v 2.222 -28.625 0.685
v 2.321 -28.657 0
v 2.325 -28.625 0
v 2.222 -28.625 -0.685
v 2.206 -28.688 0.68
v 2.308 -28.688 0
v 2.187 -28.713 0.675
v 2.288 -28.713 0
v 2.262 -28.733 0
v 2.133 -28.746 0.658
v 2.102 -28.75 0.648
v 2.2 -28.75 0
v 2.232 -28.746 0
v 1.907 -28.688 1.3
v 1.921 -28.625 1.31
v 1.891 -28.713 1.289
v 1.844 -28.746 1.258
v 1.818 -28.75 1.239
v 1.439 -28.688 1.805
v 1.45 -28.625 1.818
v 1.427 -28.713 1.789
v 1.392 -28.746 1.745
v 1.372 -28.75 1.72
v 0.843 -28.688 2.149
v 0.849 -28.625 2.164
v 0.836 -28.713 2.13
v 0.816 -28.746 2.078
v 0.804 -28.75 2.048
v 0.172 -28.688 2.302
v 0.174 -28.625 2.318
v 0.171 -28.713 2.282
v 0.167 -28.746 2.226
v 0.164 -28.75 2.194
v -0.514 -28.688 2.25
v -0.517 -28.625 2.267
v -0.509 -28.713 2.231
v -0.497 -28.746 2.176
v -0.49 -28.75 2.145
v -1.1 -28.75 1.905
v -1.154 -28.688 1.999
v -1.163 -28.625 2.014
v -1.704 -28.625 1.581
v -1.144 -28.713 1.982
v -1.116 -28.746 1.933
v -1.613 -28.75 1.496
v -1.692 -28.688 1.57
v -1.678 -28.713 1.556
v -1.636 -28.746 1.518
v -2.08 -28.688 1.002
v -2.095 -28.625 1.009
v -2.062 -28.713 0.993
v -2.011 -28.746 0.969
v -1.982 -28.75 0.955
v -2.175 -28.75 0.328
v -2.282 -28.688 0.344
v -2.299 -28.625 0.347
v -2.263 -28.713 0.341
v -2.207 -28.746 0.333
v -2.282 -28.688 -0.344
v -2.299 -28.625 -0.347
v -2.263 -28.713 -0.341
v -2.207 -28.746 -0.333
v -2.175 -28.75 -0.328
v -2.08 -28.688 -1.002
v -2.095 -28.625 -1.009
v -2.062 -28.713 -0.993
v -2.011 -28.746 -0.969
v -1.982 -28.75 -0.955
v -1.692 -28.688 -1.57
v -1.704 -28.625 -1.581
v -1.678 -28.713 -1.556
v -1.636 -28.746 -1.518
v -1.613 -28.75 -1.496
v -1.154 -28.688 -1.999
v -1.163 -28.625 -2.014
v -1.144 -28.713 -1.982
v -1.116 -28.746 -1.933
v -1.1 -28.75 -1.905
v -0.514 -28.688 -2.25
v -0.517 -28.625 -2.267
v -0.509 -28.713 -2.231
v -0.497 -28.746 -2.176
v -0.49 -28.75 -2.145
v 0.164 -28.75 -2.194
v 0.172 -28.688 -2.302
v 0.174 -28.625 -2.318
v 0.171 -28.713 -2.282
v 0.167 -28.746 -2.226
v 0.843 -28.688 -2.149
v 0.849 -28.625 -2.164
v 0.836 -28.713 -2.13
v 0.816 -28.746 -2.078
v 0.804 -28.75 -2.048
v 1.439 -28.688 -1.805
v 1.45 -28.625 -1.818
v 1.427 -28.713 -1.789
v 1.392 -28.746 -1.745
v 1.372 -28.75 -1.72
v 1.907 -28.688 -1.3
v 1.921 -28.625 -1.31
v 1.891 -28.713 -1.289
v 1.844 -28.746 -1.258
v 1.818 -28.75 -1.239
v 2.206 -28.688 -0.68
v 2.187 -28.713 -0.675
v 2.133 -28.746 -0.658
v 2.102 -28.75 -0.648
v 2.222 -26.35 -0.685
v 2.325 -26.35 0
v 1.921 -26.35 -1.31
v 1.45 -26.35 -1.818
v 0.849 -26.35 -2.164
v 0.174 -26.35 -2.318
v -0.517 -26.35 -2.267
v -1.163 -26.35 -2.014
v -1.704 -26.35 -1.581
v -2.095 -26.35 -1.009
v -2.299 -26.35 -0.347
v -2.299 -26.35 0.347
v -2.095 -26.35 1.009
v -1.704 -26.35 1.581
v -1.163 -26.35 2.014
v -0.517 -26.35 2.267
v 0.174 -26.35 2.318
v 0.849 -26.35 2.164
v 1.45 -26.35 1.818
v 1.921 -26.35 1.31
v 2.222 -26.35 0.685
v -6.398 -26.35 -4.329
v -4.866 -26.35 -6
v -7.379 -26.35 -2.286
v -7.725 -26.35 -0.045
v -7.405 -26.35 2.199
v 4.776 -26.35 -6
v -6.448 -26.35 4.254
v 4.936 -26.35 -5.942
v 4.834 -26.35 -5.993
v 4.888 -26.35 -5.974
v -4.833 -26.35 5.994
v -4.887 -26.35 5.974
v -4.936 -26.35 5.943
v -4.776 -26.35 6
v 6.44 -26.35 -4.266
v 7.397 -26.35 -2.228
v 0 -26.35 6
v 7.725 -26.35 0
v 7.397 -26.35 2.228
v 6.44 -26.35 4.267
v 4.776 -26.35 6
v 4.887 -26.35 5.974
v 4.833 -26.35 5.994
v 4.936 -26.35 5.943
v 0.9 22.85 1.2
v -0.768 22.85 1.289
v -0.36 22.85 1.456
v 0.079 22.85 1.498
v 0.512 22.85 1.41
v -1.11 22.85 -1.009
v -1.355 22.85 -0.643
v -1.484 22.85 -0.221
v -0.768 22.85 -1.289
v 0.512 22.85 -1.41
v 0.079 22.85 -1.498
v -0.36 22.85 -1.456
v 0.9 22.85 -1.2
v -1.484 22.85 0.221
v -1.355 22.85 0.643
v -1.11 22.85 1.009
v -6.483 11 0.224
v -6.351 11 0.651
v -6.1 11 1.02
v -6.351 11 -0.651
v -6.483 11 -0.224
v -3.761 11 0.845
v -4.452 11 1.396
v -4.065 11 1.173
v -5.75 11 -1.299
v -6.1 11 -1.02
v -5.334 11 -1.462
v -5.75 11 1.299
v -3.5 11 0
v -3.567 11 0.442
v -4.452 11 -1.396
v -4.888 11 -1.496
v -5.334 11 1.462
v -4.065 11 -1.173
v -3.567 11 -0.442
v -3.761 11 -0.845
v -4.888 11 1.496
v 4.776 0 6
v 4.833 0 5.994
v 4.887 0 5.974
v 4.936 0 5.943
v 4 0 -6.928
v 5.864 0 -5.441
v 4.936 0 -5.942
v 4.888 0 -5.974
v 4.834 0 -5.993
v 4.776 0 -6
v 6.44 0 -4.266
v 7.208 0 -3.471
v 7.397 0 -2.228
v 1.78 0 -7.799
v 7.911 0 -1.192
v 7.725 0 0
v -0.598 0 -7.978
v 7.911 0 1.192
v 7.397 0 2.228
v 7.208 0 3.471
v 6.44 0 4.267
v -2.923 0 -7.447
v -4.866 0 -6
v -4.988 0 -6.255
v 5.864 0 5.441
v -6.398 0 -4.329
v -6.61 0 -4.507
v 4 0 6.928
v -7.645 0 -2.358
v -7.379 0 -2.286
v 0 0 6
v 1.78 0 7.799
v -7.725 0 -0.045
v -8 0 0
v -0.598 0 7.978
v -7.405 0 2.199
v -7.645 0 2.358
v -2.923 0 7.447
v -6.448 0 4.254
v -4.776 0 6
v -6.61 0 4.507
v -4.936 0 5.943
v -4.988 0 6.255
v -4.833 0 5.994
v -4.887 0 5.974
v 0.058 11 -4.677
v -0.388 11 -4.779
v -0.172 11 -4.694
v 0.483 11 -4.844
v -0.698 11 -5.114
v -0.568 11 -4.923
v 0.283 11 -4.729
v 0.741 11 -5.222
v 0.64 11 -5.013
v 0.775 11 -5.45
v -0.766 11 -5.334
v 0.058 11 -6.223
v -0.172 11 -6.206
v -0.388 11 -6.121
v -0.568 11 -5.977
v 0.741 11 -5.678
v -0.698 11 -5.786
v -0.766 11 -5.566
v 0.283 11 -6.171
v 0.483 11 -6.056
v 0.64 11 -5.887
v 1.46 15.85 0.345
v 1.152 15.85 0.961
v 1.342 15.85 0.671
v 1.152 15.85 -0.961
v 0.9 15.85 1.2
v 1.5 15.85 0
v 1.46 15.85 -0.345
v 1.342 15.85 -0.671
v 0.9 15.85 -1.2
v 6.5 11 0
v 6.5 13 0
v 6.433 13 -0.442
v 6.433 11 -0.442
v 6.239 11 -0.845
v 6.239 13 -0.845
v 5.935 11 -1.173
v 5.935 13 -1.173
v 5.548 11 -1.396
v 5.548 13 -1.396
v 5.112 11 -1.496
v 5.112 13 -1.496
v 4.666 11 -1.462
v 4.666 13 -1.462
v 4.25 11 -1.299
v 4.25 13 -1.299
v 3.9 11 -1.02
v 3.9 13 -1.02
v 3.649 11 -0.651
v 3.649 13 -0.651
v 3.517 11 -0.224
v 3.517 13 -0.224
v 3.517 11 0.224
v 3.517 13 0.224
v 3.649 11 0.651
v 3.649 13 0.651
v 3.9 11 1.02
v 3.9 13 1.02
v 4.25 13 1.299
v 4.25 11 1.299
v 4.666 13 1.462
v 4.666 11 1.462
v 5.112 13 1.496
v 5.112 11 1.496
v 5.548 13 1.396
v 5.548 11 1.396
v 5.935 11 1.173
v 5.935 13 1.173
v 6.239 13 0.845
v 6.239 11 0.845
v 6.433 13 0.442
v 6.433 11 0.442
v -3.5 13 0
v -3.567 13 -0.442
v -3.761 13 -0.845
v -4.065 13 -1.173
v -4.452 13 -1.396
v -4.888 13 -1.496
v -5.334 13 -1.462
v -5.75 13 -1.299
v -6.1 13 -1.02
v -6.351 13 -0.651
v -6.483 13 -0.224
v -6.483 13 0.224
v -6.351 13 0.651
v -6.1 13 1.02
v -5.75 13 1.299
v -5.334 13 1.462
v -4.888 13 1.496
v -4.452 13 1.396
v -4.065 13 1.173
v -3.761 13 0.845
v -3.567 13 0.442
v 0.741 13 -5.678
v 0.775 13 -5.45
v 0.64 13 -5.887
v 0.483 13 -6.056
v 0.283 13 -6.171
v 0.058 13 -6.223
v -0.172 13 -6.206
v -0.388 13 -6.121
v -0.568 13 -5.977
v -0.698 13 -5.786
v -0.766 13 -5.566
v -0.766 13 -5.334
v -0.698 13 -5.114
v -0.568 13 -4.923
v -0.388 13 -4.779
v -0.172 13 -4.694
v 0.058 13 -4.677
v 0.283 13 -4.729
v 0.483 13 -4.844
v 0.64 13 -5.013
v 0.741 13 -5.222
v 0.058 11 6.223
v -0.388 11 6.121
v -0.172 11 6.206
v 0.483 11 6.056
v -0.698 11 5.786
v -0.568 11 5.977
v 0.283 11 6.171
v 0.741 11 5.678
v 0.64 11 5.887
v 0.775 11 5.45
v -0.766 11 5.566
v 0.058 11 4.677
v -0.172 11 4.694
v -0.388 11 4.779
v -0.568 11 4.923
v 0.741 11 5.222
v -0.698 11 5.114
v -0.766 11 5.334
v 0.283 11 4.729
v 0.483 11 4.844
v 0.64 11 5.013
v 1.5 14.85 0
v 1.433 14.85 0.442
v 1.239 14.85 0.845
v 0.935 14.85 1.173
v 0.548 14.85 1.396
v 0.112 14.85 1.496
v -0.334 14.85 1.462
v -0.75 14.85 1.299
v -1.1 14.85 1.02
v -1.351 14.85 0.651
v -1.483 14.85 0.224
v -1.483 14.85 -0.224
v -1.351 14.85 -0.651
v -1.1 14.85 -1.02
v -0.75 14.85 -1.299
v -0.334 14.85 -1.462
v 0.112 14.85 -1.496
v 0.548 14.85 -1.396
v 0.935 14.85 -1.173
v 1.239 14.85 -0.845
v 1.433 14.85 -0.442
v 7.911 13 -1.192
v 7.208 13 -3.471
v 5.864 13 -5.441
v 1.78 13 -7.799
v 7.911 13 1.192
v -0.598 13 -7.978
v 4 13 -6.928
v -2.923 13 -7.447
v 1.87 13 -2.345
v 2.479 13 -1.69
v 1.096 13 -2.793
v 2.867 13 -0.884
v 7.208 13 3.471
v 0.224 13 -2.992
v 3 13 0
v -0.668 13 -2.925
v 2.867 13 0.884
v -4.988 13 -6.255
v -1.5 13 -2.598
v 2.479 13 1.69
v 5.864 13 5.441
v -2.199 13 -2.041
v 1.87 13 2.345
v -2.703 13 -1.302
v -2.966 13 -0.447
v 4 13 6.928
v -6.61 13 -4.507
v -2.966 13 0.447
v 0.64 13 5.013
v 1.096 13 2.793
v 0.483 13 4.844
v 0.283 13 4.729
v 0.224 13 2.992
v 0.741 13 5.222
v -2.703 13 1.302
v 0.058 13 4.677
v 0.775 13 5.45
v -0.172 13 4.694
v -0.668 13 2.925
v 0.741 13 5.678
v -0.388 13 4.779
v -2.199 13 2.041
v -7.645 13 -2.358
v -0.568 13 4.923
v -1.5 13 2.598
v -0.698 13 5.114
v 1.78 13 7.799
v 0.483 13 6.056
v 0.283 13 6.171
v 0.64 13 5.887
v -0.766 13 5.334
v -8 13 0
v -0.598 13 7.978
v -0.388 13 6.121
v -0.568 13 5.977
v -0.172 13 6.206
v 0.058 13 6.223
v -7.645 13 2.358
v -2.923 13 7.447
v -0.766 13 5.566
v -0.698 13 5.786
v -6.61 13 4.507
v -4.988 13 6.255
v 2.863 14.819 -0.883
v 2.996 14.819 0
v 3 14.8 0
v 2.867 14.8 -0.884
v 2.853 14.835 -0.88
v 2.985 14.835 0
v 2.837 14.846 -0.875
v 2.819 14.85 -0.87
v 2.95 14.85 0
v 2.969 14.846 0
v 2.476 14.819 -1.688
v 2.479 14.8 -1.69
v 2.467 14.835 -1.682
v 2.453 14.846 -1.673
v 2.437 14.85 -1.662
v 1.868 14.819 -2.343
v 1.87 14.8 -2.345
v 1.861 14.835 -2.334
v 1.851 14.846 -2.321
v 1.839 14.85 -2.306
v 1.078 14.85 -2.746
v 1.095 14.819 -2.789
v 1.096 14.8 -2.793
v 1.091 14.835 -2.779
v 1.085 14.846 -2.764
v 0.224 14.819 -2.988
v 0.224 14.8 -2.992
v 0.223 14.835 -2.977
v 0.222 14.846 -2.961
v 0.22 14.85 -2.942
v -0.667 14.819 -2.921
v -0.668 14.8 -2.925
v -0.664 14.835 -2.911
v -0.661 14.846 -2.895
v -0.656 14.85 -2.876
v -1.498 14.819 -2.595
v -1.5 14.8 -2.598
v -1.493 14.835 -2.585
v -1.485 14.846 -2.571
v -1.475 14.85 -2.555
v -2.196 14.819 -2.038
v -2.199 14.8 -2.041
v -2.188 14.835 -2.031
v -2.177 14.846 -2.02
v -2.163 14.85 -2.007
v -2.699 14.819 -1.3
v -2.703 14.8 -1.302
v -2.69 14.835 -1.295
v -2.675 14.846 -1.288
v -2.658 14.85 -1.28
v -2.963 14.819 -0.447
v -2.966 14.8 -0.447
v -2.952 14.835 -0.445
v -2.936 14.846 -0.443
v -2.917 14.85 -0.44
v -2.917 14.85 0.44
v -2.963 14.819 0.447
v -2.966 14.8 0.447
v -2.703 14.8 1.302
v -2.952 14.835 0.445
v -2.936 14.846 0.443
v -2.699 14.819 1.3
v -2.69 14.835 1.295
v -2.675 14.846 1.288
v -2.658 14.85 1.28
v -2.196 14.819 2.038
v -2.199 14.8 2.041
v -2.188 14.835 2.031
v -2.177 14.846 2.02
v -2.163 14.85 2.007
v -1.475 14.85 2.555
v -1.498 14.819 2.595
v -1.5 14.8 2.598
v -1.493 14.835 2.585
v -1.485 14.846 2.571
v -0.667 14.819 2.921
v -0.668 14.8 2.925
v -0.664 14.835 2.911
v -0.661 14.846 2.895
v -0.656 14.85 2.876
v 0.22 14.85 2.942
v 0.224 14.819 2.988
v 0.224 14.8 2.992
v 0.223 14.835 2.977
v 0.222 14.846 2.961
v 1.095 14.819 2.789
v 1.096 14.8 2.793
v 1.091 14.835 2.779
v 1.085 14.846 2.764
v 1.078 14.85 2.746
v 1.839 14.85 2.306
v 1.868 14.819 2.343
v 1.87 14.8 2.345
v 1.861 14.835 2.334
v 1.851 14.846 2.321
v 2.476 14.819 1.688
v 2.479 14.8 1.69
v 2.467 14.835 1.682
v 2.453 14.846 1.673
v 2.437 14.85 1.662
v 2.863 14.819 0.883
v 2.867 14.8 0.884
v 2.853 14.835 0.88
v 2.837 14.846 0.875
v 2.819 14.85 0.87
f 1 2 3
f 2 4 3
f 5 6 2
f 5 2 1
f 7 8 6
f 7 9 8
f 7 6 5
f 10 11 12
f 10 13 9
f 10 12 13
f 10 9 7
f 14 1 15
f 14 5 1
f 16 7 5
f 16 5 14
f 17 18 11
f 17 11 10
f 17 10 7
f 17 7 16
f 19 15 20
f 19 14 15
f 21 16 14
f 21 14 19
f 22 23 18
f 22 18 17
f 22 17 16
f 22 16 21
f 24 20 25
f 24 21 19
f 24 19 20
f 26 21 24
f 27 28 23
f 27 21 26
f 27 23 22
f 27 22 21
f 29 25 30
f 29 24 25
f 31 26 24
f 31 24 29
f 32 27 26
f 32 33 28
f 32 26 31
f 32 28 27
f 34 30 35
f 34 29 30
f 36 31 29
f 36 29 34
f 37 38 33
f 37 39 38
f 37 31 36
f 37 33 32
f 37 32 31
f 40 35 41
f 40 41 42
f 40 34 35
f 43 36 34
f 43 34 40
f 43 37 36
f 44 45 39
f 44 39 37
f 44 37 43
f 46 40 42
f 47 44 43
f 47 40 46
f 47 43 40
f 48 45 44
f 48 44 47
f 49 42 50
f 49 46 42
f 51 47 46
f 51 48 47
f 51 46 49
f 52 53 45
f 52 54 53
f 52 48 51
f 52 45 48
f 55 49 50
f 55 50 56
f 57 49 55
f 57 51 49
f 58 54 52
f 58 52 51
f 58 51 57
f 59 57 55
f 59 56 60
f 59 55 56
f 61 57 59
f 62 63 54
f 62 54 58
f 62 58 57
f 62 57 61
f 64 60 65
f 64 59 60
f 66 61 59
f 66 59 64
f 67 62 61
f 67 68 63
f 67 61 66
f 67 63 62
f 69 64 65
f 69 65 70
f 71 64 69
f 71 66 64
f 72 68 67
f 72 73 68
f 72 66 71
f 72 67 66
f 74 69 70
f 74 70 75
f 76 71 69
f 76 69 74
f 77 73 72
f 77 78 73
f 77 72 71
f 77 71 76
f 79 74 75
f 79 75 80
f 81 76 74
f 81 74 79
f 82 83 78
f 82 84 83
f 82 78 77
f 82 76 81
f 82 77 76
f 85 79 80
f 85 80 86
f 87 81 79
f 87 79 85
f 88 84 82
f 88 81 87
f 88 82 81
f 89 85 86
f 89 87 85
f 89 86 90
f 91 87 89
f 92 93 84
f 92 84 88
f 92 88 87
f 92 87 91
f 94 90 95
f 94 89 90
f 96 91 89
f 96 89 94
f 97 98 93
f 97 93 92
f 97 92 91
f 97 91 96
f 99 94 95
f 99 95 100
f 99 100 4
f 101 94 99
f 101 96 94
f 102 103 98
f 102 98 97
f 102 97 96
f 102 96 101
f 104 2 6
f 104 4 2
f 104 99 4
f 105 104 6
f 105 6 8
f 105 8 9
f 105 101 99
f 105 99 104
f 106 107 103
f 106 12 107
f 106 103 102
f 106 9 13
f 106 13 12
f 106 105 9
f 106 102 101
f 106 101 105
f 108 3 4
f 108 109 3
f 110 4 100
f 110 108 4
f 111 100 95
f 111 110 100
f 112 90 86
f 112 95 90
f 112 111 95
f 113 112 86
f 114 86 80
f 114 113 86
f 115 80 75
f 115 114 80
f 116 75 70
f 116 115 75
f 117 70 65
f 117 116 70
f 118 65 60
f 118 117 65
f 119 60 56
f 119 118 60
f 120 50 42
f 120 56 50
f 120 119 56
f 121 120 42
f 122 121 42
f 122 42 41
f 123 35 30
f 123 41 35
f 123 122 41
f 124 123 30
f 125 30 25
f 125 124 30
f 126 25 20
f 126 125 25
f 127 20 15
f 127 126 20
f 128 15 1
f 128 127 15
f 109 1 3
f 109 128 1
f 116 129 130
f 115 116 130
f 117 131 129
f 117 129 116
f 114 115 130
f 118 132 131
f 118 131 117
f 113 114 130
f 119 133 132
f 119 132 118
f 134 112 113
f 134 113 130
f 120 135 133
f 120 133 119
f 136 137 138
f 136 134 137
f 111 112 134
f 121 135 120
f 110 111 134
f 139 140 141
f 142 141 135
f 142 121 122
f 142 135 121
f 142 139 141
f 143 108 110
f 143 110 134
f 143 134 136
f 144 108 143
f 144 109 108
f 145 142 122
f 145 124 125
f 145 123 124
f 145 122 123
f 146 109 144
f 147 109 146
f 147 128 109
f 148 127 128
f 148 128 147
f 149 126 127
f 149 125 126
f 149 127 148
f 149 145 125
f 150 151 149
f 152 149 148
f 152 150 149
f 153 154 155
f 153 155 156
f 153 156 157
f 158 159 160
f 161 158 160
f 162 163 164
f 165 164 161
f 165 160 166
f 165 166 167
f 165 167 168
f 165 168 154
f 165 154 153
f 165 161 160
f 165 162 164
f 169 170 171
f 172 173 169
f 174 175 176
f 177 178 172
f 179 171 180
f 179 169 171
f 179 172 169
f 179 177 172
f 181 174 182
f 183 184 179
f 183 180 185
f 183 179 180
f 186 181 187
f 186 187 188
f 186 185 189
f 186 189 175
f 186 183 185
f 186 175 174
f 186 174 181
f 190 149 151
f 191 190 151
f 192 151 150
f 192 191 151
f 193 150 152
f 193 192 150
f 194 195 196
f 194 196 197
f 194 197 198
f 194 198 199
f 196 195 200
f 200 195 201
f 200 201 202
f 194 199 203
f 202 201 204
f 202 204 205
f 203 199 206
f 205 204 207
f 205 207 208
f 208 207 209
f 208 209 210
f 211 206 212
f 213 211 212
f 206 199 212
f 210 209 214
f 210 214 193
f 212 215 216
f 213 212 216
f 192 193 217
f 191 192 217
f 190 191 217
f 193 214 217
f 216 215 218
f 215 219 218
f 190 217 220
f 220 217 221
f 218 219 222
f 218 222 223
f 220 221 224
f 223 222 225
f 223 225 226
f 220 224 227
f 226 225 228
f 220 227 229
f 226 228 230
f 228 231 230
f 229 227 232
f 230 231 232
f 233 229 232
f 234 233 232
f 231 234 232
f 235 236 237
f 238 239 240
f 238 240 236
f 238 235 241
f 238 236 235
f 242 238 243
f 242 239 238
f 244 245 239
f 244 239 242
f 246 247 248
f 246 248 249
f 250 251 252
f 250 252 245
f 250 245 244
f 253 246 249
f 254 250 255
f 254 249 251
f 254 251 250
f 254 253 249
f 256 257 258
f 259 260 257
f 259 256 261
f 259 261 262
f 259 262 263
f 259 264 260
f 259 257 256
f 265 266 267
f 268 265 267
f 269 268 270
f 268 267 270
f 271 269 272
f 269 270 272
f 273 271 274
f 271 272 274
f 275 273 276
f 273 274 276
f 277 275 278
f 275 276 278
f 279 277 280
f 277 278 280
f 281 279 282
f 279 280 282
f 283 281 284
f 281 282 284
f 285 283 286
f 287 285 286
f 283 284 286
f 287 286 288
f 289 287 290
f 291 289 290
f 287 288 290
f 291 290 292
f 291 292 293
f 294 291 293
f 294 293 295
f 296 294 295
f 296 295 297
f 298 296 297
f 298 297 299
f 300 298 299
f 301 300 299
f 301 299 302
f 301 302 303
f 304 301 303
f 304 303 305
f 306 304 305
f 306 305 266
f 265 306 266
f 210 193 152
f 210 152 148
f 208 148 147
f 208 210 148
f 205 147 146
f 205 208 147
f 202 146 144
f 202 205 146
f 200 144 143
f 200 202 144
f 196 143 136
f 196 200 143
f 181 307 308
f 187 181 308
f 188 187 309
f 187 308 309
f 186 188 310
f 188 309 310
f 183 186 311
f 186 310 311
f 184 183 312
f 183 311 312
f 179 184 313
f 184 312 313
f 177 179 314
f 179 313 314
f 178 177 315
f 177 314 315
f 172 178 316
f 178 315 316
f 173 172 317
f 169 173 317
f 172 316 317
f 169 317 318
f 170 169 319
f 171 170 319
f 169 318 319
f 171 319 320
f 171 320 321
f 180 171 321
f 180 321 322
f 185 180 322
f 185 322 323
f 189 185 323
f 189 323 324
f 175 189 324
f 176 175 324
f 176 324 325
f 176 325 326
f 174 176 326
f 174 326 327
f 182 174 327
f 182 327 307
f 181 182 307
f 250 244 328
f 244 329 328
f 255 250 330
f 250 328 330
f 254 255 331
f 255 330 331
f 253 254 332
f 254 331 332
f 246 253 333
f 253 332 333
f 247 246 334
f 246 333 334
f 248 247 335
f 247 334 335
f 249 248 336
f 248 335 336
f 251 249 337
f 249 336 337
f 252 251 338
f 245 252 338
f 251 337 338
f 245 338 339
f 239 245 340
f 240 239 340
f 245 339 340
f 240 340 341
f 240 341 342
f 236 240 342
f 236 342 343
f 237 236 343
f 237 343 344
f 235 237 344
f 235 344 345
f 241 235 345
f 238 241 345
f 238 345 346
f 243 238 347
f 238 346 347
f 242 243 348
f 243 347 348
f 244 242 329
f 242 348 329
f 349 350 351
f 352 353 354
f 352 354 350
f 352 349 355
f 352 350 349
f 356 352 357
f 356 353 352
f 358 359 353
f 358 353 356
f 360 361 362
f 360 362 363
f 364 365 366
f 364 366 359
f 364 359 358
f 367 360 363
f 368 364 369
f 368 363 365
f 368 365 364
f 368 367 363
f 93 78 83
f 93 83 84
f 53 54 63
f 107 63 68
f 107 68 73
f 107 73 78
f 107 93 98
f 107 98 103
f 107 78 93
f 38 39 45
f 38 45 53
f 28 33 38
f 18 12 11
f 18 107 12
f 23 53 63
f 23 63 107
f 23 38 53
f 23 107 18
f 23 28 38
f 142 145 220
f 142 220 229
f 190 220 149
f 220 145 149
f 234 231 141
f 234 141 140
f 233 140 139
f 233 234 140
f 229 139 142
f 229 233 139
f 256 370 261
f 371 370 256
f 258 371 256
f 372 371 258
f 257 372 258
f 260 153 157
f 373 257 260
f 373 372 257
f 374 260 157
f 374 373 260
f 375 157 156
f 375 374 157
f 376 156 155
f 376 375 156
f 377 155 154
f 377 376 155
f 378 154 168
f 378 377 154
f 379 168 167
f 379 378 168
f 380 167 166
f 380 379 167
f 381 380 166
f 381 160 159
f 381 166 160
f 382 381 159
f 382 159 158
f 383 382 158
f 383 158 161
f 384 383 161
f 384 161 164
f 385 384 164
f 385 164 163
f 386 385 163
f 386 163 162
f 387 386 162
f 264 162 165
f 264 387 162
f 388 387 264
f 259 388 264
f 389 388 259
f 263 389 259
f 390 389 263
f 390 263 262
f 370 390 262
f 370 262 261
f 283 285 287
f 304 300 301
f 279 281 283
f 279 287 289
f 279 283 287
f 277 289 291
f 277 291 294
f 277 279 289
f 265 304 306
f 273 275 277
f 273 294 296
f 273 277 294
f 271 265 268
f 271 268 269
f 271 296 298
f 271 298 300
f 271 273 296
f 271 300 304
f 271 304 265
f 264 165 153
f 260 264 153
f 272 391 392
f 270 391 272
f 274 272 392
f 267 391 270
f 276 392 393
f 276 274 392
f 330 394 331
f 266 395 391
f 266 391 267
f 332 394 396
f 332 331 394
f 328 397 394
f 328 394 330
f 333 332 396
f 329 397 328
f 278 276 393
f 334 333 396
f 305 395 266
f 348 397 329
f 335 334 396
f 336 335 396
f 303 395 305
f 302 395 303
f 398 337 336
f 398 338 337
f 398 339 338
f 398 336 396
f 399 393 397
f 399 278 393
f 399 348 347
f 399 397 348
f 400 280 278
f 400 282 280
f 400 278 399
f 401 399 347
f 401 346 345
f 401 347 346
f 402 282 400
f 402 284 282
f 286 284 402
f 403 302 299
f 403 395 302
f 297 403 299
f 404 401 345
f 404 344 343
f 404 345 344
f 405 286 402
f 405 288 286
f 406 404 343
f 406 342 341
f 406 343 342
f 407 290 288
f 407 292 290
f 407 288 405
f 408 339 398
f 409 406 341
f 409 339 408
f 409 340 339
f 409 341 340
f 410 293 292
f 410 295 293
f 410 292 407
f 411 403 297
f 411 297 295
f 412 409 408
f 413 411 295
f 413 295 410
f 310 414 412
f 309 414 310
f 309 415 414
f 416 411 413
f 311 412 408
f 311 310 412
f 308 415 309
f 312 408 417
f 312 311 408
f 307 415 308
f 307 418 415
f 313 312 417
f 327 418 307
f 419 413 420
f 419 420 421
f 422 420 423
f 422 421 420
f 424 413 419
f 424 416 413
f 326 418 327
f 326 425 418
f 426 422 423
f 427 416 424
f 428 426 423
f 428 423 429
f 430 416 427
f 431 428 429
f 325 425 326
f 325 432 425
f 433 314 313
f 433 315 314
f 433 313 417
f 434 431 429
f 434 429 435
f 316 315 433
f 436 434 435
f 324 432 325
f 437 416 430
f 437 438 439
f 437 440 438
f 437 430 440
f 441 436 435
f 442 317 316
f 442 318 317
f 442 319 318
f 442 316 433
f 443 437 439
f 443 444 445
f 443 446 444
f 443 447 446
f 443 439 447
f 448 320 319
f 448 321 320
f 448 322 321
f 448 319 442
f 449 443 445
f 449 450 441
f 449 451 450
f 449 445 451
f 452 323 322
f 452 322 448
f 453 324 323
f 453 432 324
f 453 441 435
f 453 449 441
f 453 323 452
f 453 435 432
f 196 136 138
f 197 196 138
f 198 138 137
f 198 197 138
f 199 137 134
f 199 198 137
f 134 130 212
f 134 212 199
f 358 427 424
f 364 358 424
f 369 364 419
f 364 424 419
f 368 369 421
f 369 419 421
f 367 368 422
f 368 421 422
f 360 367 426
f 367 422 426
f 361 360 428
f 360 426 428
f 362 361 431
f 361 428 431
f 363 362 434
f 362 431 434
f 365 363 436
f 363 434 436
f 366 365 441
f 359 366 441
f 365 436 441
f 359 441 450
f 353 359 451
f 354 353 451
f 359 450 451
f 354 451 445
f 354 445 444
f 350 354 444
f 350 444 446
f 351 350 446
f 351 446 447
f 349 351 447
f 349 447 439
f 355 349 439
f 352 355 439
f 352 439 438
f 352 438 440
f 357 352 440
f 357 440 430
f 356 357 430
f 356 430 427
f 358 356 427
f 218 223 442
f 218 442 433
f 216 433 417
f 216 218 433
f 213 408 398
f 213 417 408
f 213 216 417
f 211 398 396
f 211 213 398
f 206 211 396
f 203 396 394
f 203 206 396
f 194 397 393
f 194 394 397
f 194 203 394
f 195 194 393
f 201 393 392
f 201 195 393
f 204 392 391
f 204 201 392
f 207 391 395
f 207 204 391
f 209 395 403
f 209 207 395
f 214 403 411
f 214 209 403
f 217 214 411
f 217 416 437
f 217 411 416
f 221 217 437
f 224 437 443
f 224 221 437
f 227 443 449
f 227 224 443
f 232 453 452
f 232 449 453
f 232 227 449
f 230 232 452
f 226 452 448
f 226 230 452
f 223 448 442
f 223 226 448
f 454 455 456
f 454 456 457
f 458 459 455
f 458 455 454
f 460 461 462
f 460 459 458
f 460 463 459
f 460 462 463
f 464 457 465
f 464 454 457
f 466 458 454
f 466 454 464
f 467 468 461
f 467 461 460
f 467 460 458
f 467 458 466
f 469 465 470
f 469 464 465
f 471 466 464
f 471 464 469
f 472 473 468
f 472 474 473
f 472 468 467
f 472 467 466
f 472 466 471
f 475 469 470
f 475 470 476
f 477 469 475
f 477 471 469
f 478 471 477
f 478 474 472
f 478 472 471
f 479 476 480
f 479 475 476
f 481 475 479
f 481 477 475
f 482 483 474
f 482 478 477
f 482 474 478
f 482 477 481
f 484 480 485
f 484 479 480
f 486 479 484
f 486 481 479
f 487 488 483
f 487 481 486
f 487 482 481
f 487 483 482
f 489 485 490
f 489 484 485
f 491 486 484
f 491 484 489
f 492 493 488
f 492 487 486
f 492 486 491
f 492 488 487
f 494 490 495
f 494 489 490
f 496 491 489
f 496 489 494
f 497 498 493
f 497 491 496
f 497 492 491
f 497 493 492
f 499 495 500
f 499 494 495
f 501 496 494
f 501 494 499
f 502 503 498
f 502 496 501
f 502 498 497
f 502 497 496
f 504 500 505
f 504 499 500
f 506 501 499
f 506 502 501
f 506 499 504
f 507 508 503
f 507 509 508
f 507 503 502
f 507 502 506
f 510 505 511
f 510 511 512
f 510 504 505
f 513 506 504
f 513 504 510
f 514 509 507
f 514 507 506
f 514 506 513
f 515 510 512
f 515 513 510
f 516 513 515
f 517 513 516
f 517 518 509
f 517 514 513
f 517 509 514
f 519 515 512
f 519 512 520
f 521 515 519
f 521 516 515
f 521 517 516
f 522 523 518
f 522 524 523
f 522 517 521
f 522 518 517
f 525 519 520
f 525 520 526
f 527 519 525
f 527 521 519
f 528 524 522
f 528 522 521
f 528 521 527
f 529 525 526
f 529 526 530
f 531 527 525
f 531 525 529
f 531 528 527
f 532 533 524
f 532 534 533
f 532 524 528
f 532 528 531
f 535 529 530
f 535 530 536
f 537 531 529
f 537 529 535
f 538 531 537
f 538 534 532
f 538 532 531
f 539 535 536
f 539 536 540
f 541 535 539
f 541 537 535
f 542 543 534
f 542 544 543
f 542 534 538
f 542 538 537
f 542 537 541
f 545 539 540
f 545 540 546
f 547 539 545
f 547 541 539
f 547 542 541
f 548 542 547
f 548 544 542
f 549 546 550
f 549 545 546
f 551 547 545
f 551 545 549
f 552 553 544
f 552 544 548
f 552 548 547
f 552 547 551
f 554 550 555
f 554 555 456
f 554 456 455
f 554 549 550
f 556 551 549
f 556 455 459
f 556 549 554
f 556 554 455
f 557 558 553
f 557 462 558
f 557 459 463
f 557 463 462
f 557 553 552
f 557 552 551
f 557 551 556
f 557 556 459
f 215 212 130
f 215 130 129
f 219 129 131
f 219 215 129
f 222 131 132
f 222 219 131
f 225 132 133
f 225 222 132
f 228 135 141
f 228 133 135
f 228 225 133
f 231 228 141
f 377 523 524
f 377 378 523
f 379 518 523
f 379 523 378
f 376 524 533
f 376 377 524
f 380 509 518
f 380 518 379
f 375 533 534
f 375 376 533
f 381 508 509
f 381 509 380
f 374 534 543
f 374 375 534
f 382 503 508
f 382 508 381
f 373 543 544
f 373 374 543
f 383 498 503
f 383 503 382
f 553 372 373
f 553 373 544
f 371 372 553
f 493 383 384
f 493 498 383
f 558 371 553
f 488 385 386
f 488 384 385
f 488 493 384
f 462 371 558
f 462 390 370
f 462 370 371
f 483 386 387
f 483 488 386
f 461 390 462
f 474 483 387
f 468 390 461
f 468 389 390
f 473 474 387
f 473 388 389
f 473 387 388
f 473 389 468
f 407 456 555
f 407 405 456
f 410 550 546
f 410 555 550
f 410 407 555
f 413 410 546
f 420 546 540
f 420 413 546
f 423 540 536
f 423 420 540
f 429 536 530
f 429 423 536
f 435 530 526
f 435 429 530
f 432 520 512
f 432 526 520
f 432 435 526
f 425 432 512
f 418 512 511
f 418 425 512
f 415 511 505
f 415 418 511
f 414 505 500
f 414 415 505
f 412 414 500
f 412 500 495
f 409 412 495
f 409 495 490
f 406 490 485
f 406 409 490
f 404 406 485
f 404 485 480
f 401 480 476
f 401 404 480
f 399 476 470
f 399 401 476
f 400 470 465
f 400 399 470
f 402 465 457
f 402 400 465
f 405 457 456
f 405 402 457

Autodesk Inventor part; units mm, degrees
ref_plane "YZ Plane" through (0, 0, 0) normal (1, 0, 0) x (0, 1, 0)
ref_plane "XZ Plane" through (0, 0, 0) normal (0, 1, 0) x (-1, 0, 0)
ref_plane "XY Plane" through (0, 0, 0) normal (0, 0, 1) x (1, 0, 0)
sketch "Sketch1" plane through (0, 0, 0) normal (0, 1, 0) x (-1, 0, 0)
  circle A0 centre (0, 0) radius 8
  dimension "d0" = 16
extrude "Extrusion1" add sketch "Sketch1" along normal blind 13
sketch "Sketch2" plane through (0, 13, 0) normal (0, 1, 0) x (1, 0, 0)
  circle A0 centre (0, 0) radius 3
  dimension "d3" = 6
extrude "Extrusion2" add sketch "Sketch2" along normal blind 1.85
sketch "Sketch3" plane through (0, 14.85, 0) normal (0, 1, 0) x (1, 0, 0)
  circle A0 centre (0, 0) radius 1.5
  dimension "d6" = 3
extrude "Extrusion3" add sketch "Sketch3" along normal blind 8
sketch "Sketch4" plane through (0, 22.85, 0) normal (0, 1, 0) x (1, 0, 0)
  circle A0 centre (0, 0) radius 1.5 projected
  line L0 (0.9, 0) -> (0.9, 1.2)
  line L1 (0.9, 1.2) -> (0.9, -1.2)
  circle A1 centre (0, 0) radius 3 projected
  arc A2 (0.9, -1.2) -> (0.9, 1.2) centre (0, 0) ccw
extrude "Extrusion4" cut sketch "Sketch4" against normal blind 7 contours A0 L1 L0 picked at (0.9839, 0.7204)
sketch "Sketch5" plane through (0, 13, 0) normal (0, 1, 0) x (1, 0, 0)
  circle A0 centre (5, 0) radius 1.5
  circle A1 centre (-5, 0) radius 1.5
  point P0 (0, 0)
extrude "Extrusion5" cut sketch "Sketch5" against normal blind 2
sketch "Sketch6" plane through (0, 13, 0) normal (0, 1, 0) x (1, 0, 0)
  circle A0 centre (0, 0) radius 8 projected
  circle A1 centre (0, -5.45) radius 0.775
  line L0 (-8, 0) -> (8, 0)
  circle A2 centre (0, 5.45) radius 0.775
extrude "Extrusion6" cut sketch "Sketch6" against normal blind 2 contours A1 | A2
sketch "Sketch7" plane through (0, 13, 0) normal (0, 1, 0) x (1, 0, 0)
  point P0 (0, 0)
sketch "Sketch8" plane through (0, 0, 0) normal (0, -1, 0) x (1, 0, 0)
  circle A0 centre (0, 0) radius 7.725
  dimension "d22" = 15.45
extrude "Extrusion7" add sketch "Sketch8" along normal blind 26.35
sketch "Sketch9" plane through (0, -26.35, 0) normal (0, -1, 0) x (1, 0, 0)
  line L0 (0, -6) -> (-4.8658, -6)
  circle A0 centre (0, 0) radius 7.725 projected
  line L1 (0, -6) -> (4.8658, -6)
  line L2 (0, 6) -> (-4.8653, 6.0004)
  line L3 (0, 6) -> (4.8652, 6.0004)
  arc A1 (-4.8658, -6) -> (4.8658, -6) centre (0, 0) ccw
  arc A2 (4.8652, 6.0004) -> (-4.8653, 6.0004) centre (0, 0) ccw
extrude "Extrusion8" cut sketch "Sketch9" against normal blind 26.35 contours L1 A0 L0 | A0 L3 L2
sketch "Sketch10" plane through (0, -26.35, 0) normal (0, -1, 0) x (1, 0, 0)
  circle A0 centre (0, 0) radius 2.325
  dimension "d29" = 4.65
extrude "Extrusion9" add sketch "Sketch10" along normal blind 2.4
fillet "Fillet1" radius 0.125 1 edges at (-2.325, -28.75, 0)
fillet "Fillet2" radius 0.05 1 edges at (-3, 14.85, 0)
fillet "Fillet3" radius 0.25 3 edges at (4.8658, -13.175, -6) (-4.8653, -13.175, 6.0004) (4.8652, -13.175, 6.0004)
properties part number "Motor DC 21mm"
